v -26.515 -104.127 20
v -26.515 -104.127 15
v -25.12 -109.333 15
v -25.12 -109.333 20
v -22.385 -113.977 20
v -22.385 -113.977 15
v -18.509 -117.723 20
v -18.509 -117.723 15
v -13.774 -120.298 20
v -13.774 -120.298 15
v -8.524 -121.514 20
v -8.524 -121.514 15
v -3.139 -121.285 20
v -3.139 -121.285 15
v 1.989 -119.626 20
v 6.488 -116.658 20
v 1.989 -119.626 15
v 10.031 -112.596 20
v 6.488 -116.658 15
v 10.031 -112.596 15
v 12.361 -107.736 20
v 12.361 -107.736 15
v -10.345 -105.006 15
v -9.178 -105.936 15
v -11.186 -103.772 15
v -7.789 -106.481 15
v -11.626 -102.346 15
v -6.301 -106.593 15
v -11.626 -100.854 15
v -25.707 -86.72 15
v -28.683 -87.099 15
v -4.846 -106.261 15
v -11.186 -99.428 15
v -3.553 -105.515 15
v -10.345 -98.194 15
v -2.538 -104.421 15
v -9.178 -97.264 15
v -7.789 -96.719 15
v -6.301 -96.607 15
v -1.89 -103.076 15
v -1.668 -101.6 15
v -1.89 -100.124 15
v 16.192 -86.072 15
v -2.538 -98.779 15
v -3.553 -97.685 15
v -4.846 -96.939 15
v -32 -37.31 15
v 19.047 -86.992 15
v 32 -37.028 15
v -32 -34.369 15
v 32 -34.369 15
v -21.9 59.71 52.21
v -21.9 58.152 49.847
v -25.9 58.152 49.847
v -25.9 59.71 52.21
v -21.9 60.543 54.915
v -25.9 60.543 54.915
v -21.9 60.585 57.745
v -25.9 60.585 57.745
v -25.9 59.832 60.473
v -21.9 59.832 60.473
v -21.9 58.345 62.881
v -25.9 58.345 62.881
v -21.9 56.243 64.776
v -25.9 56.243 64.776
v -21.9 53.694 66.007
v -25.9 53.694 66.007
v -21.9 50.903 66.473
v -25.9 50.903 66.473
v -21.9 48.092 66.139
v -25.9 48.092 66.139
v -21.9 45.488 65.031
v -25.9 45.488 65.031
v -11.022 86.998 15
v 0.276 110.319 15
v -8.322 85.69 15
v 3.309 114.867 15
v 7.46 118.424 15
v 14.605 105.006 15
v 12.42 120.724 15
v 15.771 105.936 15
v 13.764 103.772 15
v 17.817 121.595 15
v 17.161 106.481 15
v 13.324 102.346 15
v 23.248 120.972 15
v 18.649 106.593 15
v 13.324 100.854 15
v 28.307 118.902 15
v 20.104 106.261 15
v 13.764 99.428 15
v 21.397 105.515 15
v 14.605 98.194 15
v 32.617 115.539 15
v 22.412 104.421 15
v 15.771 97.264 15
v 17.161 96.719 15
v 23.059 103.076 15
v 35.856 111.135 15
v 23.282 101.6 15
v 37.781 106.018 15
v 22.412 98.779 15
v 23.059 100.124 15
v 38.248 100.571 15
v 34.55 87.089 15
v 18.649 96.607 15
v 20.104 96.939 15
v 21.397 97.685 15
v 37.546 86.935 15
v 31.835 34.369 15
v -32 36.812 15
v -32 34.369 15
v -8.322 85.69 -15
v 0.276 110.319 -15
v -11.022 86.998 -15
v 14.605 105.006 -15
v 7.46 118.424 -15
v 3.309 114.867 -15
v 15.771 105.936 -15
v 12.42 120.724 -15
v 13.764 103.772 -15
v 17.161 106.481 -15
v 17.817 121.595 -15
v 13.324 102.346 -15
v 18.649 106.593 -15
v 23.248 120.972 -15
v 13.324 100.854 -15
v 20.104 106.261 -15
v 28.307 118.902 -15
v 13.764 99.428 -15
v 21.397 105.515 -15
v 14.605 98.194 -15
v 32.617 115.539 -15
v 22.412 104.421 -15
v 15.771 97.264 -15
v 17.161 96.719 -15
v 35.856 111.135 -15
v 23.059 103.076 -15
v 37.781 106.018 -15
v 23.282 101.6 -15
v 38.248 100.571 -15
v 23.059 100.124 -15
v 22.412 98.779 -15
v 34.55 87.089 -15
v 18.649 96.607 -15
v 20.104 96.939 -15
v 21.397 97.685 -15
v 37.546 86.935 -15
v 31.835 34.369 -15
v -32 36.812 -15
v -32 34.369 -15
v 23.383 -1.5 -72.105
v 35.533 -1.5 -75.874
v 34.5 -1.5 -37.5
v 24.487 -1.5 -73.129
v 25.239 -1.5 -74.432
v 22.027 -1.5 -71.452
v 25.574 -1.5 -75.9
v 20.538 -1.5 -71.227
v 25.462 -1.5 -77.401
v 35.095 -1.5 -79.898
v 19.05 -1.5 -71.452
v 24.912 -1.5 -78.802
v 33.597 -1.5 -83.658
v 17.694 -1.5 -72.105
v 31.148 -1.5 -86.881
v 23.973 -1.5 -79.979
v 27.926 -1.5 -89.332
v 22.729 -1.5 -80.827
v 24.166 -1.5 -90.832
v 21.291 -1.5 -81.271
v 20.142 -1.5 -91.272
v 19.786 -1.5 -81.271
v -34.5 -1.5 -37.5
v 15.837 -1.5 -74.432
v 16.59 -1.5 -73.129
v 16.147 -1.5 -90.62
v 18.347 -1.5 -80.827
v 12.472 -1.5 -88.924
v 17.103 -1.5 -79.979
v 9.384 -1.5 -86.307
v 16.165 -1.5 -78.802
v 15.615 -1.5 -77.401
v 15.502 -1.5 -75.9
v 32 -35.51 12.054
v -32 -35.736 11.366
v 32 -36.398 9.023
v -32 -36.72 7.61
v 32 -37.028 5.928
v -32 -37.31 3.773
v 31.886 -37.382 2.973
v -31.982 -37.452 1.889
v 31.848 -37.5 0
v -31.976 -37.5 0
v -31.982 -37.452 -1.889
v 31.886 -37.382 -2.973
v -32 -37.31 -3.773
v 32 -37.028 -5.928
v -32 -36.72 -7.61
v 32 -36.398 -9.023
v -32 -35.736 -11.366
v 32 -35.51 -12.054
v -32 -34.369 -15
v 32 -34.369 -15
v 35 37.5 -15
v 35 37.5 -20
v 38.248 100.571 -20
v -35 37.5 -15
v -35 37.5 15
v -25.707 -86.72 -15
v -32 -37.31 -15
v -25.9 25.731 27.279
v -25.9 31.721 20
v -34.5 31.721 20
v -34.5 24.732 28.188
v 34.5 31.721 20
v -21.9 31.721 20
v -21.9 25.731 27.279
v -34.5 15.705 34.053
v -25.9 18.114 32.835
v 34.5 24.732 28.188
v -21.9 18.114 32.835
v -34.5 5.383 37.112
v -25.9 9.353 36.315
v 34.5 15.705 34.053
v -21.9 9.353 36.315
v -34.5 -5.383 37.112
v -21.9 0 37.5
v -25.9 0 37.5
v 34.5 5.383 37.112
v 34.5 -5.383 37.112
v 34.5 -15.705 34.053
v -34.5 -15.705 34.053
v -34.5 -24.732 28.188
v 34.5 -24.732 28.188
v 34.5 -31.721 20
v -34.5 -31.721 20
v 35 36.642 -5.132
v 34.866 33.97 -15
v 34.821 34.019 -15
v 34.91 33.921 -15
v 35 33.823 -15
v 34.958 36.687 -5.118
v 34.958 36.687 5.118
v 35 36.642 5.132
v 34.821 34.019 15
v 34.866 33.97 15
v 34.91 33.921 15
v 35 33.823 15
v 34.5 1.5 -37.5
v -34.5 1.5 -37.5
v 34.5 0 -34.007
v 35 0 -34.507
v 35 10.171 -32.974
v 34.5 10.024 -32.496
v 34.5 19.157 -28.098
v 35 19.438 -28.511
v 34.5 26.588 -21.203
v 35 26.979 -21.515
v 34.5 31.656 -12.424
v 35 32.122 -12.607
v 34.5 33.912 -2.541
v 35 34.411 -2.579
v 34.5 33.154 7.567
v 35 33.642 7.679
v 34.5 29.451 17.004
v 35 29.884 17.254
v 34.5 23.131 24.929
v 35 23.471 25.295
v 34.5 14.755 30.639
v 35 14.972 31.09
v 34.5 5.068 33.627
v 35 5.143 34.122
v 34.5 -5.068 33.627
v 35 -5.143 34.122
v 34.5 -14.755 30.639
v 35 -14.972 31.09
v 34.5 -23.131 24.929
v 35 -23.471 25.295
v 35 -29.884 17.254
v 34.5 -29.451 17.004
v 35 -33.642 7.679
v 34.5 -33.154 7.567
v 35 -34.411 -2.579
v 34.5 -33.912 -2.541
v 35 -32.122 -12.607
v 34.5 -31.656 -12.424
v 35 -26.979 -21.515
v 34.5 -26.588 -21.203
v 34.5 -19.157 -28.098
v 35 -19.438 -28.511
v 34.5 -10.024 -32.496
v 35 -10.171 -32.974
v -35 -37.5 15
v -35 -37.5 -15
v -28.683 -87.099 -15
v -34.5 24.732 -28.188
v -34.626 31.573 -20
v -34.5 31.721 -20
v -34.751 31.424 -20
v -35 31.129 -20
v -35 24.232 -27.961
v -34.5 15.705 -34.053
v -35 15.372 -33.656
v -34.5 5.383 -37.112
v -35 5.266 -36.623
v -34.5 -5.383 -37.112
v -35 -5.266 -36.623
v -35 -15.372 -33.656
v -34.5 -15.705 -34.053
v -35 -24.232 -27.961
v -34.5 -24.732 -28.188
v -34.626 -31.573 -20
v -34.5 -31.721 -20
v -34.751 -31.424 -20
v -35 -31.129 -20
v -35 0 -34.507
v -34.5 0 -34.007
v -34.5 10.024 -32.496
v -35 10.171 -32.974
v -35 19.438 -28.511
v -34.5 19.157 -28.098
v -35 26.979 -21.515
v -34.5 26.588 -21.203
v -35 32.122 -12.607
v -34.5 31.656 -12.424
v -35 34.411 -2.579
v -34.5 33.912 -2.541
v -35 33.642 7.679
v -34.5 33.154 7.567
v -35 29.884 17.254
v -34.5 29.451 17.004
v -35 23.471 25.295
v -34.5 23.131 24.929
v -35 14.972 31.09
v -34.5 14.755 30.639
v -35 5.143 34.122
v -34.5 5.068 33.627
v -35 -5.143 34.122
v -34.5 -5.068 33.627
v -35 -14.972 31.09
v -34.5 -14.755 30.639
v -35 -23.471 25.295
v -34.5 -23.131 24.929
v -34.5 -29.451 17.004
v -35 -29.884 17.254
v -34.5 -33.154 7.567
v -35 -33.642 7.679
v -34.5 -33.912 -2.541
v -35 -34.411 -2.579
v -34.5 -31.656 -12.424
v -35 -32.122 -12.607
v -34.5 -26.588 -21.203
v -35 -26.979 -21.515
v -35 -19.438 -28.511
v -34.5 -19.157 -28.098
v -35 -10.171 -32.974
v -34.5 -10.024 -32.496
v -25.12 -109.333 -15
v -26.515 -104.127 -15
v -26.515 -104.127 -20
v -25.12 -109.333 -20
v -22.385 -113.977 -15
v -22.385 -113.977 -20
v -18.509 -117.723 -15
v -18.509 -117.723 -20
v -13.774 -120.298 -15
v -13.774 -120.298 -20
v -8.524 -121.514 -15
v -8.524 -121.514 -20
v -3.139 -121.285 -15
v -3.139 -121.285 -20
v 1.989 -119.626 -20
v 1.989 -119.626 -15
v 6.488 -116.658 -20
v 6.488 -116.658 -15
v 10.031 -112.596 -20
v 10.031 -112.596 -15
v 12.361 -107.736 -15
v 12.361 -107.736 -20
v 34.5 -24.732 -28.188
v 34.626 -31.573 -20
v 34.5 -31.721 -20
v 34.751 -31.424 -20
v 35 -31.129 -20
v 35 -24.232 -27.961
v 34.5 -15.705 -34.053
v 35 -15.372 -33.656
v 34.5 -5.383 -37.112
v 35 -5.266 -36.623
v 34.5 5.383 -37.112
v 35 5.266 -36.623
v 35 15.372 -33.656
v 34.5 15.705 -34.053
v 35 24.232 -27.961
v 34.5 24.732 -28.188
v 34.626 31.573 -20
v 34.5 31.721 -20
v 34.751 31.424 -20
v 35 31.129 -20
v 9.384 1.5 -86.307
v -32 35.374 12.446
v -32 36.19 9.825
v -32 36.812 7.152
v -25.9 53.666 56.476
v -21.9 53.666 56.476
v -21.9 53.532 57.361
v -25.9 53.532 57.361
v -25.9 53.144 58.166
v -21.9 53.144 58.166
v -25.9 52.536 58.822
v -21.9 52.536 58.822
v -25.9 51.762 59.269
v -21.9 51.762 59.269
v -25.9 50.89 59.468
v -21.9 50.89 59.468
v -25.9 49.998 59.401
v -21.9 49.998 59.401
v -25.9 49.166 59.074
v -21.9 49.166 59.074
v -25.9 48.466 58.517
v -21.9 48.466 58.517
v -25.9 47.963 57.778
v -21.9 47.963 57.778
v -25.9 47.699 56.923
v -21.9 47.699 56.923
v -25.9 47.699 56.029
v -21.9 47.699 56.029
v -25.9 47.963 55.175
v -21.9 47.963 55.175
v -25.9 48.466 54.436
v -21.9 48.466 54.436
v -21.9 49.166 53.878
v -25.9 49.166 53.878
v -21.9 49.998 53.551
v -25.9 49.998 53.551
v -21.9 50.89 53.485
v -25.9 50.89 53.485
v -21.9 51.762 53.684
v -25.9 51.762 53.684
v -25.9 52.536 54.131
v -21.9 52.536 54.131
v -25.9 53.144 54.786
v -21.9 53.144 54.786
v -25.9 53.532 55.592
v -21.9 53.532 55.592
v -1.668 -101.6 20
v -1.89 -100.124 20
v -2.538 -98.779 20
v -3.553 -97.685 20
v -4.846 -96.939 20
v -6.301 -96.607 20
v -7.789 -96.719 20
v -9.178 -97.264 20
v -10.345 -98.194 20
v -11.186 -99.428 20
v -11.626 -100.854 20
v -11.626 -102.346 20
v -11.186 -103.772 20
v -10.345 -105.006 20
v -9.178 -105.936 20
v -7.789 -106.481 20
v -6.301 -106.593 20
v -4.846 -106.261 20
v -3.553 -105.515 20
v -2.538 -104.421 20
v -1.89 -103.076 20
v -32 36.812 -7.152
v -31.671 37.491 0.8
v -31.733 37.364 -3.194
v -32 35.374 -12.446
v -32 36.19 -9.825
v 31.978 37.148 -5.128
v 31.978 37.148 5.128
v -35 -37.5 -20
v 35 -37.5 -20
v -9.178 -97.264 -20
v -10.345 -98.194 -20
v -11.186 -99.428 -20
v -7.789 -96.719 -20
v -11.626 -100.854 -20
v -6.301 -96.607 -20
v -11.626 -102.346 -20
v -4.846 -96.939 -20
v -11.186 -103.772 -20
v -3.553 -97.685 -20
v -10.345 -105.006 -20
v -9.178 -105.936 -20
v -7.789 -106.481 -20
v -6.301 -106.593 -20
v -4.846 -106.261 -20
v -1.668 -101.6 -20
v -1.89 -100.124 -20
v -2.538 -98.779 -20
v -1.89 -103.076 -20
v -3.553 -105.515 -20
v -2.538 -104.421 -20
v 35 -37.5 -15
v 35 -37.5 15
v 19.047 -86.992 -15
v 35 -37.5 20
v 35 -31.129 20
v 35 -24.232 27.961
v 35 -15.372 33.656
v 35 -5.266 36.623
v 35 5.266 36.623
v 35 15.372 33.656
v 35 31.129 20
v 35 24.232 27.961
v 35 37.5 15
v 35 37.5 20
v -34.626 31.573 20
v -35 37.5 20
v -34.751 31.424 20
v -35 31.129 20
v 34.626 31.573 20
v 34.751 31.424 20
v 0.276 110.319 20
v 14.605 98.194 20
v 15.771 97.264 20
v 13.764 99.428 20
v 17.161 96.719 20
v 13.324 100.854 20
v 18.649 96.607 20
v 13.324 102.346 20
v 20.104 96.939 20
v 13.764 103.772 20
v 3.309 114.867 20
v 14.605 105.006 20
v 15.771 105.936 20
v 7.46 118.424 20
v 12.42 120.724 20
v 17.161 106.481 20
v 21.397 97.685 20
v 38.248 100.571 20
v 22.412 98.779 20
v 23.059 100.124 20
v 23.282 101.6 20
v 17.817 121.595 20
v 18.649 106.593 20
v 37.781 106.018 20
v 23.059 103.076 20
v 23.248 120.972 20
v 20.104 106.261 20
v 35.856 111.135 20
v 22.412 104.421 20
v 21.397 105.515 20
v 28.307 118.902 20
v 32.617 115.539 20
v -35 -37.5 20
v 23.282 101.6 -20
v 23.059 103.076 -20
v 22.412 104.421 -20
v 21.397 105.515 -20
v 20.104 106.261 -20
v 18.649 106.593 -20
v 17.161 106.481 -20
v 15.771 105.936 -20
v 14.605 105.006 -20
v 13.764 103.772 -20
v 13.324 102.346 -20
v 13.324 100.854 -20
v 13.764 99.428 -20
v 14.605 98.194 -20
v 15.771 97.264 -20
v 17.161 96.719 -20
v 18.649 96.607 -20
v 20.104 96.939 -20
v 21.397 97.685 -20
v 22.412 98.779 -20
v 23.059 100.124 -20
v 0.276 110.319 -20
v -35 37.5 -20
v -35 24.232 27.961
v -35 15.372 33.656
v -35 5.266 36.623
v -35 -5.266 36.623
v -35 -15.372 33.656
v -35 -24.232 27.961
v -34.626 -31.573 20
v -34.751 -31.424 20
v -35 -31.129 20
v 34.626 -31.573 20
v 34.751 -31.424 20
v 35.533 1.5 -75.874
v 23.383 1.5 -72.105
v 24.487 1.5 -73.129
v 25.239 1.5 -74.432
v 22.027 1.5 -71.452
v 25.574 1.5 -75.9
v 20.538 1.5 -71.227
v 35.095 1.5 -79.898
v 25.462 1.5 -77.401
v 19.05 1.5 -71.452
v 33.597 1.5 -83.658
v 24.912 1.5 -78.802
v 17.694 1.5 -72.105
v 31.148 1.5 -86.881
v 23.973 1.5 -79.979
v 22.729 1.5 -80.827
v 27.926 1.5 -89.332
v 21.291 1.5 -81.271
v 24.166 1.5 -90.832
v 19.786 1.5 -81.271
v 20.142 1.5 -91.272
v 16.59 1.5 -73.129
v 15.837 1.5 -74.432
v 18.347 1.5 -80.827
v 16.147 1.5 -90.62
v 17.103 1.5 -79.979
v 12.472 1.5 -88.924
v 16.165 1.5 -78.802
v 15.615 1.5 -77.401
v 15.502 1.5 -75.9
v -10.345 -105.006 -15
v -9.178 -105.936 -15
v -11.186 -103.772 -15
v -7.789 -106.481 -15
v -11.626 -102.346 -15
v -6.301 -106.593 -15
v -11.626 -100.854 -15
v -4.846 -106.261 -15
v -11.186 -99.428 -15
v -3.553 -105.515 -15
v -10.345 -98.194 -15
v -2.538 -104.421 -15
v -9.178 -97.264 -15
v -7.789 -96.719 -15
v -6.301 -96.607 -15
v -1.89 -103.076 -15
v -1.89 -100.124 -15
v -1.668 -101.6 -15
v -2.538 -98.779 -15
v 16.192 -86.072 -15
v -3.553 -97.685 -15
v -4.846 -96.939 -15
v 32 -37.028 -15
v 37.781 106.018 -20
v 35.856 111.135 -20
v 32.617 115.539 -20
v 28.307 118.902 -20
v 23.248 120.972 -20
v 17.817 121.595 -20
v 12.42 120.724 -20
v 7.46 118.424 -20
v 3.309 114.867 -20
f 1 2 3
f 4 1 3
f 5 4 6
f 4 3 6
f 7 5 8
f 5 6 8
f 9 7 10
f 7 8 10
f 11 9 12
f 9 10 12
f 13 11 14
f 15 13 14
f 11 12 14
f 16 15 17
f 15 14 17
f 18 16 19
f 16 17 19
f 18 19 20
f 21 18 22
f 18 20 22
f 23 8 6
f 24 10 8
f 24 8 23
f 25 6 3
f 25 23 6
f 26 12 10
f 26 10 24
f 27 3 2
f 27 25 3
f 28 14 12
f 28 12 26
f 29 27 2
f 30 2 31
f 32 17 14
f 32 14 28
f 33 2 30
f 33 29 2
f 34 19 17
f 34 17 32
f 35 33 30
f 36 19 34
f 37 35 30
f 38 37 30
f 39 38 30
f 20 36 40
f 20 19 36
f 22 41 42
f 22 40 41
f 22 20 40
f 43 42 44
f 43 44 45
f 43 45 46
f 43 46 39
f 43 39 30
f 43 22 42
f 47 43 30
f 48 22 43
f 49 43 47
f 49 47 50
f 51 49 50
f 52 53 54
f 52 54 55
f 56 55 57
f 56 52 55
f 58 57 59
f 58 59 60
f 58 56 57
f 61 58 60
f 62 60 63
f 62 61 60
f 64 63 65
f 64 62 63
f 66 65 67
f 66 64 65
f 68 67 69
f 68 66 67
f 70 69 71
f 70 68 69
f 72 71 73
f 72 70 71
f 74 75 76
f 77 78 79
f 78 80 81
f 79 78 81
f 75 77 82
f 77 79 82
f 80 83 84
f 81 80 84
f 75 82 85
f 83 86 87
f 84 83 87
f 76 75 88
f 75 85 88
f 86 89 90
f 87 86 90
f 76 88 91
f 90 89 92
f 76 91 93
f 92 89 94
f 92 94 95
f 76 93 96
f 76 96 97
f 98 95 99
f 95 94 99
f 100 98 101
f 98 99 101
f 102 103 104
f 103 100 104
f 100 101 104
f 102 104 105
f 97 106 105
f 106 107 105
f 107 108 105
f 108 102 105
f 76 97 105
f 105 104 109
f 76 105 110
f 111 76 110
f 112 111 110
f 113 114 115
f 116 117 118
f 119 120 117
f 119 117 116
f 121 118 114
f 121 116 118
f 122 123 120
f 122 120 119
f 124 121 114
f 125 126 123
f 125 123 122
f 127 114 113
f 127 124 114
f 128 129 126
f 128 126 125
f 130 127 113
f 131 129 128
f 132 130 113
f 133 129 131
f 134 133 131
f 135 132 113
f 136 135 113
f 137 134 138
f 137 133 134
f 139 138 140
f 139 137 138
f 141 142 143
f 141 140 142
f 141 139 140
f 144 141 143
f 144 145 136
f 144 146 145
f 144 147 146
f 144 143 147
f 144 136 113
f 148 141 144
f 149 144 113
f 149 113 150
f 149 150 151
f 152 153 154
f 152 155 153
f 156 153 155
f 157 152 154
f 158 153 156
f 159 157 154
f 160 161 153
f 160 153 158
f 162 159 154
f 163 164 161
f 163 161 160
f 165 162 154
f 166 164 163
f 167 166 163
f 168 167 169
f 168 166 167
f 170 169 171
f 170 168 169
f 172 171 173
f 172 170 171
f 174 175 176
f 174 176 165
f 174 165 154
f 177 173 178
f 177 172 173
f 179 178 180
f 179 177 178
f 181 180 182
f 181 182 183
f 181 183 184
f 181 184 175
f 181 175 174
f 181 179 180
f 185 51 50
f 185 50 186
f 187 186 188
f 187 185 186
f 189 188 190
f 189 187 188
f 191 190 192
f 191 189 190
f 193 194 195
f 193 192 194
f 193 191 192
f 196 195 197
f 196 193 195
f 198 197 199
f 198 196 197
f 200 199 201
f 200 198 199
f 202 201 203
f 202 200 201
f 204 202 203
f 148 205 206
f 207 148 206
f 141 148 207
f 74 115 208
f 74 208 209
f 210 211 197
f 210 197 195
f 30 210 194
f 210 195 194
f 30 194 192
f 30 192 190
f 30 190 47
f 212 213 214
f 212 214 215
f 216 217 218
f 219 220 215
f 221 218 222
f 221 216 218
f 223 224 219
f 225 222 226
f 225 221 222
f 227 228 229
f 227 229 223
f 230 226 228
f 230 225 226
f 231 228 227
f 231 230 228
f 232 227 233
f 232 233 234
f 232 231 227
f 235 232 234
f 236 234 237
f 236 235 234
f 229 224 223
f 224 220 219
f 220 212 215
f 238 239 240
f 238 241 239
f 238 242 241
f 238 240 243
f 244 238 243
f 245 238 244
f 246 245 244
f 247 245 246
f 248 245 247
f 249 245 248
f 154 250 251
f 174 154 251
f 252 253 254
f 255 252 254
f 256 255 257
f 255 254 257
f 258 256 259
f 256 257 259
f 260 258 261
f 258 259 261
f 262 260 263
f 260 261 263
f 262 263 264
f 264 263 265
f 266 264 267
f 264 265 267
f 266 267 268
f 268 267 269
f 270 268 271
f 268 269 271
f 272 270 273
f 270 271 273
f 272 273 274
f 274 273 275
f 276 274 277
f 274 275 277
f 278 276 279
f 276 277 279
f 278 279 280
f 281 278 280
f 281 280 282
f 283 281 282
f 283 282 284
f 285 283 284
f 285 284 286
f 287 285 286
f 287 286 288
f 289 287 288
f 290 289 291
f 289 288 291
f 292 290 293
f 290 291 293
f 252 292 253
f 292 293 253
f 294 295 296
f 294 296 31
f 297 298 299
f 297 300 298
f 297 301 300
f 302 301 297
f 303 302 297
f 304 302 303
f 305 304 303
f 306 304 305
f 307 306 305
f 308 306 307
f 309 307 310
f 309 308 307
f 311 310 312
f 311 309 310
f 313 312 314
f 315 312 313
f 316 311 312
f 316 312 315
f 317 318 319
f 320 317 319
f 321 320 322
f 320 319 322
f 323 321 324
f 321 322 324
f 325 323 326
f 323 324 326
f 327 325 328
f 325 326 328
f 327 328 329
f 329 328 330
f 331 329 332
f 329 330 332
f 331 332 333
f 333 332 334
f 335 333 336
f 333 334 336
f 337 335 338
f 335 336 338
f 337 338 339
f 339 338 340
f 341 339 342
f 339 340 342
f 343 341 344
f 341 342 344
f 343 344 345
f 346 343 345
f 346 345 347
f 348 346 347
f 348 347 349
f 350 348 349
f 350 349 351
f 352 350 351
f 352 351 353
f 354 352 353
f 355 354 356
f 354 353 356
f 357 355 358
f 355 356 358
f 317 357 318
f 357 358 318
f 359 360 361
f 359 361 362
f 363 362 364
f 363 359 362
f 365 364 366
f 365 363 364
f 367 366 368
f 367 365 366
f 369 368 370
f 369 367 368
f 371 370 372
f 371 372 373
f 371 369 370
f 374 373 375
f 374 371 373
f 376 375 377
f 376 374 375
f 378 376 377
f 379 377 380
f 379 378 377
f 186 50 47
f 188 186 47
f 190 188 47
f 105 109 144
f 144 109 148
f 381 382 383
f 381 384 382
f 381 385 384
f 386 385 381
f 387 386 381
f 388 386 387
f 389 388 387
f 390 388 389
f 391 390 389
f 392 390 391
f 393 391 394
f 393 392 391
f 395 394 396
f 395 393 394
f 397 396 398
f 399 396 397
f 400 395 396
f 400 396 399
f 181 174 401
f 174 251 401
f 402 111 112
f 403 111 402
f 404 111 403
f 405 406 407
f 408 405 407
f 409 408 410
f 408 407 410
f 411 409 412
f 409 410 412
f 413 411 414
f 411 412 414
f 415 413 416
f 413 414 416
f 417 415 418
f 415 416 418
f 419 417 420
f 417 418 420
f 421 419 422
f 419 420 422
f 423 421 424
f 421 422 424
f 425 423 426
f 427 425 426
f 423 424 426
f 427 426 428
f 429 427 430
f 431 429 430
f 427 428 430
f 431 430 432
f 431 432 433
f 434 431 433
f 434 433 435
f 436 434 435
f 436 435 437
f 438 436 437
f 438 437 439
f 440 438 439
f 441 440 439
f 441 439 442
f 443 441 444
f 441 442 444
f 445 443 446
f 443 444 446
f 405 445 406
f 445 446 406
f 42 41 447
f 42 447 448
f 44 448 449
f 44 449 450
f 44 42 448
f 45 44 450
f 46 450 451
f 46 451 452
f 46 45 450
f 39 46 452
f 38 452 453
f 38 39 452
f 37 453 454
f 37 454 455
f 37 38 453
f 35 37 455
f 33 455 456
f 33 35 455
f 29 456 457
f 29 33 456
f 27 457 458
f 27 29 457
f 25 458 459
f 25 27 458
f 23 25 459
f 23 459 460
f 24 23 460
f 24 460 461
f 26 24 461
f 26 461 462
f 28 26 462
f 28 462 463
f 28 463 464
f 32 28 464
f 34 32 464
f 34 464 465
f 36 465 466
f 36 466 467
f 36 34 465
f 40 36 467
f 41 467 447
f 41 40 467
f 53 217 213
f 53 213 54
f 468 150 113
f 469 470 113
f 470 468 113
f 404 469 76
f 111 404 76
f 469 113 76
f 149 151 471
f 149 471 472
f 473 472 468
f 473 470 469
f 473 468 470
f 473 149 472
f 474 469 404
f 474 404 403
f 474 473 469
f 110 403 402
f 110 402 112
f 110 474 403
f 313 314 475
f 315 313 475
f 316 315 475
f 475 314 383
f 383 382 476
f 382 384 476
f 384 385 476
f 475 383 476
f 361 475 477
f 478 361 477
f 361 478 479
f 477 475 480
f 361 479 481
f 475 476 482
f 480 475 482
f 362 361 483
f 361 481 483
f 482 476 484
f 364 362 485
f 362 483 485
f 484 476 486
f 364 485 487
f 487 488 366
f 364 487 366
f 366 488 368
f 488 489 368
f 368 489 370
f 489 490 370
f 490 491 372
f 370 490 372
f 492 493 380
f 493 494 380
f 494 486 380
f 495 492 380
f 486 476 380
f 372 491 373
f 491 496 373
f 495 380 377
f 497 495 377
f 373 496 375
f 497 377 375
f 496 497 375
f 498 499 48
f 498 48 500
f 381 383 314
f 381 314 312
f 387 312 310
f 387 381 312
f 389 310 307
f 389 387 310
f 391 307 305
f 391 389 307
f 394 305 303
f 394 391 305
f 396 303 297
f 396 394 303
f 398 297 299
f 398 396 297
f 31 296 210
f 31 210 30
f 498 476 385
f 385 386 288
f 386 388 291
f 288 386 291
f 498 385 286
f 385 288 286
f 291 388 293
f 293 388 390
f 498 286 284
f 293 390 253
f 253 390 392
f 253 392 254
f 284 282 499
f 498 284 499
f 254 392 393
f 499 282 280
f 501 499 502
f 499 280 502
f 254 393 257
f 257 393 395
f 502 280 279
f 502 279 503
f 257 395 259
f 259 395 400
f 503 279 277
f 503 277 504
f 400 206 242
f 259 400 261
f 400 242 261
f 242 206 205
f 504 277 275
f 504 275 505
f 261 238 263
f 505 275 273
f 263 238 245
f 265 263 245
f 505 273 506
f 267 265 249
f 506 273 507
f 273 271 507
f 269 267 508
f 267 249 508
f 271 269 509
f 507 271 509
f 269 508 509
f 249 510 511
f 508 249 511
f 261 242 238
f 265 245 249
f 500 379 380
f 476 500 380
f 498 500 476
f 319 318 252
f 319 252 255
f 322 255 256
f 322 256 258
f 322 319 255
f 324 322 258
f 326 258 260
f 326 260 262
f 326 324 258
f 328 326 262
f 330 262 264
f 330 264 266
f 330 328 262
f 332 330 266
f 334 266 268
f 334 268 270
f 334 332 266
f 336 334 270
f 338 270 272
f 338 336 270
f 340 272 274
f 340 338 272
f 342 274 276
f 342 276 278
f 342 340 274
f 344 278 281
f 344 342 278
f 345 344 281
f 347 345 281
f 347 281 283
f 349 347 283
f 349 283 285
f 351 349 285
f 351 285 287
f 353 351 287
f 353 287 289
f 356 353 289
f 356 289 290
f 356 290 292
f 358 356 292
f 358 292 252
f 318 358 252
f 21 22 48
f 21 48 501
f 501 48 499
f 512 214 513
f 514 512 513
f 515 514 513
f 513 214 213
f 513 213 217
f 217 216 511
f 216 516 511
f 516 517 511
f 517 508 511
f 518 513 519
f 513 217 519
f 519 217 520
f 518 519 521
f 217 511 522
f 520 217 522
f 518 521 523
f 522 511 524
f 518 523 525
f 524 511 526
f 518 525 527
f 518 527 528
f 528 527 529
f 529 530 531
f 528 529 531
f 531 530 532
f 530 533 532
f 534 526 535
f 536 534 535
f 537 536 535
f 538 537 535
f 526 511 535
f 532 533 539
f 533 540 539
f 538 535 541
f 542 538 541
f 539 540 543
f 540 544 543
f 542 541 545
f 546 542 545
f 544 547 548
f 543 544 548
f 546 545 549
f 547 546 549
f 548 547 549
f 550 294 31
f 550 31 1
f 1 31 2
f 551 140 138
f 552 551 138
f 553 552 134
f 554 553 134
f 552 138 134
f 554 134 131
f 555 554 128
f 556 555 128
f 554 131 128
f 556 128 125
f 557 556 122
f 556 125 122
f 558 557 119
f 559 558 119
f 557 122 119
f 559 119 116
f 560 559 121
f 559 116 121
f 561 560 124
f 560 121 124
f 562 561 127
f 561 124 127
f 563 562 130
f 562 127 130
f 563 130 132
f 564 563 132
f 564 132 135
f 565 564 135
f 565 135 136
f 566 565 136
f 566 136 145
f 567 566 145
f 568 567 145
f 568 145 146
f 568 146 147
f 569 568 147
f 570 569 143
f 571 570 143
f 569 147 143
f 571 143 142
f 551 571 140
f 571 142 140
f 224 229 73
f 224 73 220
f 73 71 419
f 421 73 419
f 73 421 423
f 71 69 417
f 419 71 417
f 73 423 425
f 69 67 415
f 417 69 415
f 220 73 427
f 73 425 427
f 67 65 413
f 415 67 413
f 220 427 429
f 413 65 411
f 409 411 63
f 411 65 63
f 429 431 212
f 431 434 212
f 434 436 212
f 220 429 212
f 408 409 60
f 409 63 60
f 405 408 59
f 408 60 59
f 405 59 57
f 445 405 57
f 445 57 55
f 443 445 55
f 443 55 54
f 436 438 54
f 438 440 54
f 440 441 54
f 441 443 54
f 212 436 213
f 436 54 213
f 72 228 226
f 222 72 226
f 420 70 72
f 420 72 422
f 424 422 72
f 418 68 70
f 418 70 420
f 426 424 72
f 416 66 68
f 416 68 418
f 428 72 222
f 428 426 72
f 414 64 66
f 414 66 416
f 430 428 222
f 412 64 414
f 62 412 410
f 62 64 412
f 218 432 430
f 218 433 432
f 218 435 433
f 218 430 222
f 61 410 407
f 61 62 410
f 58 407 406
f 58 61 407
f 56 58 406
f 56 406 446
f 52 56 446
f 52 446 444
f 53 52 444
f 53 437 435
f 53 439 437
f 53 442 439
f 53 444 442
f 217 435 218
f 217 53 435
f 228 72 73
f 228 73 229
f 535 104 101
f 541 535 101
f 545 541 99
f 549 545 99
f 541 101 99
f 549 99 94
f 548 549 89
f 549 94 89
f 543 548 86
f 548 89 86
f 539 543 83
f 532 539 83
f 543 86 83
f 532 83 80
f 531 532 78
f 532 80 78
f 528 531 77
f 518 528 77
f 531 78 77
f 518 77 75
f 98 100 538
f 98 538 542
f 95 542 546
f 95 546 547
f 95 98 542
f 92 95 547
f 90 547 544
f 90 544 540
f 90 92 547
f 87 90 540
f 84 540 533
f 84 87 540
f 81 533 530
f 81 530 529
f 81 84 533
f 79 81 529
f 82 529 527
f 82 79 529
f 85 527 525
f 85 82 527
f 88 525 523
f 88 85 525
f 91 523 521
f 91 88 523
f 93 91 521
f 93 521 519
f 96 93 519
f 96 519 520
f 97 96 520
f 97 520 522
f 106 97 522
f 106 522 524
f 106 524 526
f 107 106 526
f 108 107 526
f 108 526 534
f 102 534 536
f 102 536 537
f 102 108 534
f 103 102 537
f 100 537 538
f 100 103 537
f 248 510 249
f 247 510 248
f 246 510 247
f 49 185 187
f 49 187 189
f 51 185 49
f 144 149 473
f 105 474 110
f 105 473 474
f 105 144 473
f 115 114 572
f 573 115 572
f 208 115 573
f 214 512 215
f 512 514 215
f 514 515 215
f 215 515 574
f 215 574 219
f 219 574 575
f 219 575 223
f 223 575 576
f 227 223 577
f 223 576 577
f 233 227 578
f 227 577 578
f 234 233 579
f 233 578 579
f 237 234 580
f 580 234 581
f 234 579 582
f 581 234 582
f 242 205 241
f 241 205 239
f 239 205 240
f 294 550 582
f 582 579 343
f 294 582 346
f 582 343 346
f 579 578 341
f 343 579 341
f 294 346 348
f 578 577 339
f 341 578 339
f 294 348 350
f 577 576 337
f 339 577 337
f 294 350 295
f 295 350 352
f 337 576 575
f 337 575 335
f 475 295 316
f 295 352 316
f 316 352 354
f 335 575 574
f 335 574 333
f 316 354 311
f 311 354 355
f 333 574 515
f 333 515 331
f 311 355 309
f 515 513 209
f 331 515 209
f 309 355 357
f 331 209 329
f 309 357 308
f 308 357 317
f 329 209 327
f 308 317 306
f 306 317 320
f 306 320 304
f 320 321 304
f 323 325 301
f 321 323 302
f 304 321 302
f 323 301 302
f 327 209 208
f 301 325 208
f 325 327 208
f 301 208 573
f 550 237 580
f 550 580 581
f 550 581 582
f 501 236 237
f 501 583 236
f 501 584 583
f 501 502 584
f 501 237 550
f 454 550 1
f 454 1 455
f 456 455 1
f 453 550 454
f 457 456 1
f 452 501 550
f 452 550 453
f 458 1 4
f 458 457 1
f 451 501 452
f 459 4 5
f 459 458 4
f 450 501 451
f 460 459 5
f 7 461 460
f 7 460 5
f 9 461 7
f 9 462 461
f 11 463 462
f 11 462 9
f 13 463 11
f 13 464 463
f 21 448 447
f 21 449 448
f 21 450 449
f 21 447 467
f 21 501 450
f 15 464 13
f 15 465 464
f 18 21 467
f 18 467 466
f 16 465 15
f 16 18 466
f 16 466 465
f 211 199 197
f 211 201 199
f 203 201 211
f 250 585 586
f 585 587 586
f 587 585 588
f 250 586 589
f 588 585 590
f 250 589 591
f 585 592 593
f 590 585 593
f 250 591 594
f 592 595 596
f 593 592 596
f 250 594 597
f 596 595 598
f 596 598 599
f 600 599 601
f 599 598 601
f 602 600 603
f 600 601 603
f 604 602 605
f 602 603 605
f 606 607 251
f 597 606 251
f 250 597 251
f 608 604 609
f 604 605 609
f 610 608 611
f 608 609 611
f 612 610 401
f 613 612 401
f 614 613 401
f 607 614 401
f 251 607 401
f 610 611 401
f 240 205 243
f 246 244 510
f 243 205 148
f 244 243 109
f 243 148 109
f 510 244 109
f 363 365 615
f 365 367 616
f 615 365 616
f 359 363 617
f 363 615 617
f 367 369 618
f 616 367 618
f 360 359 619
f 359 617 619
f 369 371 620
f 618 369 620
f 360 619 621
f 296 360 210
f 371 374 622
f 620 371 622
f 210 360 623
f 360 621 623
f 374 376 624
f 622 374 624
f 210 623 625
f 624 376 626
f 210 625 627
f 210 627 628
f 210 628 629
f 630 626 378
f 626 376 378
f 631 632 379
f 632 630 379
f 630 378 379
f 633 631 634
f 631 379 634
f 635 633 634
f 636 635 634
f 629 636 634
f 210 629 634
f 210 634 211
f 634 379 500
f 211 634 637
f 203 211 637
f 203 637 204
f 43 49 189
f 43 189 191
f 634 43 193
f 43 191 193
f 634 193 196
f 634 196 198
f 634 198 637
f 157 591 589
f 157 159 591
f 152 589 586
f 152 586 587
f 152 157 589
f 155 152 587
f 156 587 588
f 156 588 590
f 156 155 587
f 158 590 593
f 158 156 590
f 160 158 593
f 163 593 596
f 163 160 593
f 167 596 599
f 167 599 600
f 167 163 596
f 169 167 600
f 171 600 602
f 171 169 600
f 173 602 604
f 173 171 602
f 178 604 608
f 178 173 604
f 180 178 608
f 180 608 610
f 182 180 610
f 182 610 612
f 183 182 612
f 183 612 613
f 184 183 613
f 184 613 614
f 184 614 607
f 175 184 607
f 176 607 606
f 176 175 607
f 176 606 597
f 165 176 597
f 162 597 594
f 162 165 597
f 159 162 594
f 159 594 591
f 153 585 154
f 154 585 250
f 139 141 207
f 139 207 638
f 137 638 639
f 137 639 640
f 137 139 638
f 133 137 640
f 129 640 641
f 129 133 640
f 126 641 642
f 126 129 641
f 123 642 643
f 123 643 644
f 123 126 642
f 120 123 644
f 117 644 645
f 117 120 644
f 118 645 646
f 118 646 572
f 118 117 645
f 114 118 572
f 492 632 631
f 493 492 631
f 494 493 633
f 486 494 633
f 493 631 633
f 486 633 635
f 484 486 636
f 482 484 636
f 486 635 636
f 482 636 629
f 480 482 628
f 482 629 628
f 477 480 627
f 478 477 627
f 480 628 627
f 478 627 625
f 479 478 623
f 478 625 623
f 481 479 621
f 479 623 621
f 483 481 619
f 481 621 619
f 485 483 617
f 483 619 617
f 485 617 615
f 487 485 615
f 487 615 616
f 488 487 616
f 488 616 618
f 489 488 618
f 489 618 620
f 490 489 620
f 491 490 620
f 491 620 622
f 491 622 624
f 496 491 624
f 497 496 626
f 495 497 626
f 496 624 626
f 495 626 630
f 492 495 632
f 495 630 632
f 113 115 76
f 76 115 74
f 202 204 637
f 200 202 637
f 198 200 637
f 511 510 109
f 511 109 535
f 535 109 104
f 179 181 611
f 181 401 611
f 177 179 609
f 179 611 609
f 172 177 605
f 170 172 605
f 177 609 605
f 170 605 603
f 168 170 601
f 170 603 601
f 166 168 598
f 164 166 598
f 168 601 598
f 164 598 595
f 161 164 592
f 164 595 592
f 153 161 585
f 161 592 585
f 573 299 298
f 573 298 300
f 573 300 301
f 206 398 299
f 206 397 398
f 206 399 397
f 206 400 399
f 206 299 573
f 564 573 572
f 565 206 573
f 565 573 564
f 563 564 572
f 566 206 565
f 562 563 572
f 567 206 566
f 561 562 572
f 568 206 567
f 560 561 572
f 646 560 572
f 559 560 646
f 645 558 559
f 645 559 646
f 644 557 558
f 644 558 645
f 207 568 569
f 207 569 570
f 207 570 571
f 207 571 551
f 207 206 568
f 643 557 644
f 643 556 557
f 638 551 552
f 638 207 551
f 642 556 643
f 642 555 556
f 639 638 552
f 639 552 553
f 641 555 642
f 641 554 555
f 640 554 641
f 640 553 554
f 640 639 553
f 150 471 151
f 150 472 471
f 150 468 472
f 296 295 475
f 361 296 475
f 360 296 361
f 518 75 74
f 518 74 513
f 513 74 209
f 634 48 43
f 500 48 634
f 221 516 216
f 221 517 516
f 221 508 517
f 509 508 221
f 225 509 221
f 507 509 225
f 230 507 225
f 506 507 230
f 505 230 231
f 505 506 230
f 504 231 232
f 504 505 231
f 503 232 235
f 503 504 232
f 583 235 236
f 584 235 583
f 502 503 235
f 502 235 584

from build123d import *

# Parameters (mm, degrees)
SKETCH1_R             = 37.5
SKETCH1_R_2           = 34.007
BOSS_EXTRUDE1_DEPTH   = 35
BOSS_EXTRUDE2_START   = 15
SKETCH4_R             = 5.007
BOSS_EXTRUDE2_DEPTH   = 5
BOSS_EXTRUDE2_2_DEPTH = 5
BOSS_EXTRUDE3_START   = -15
SKETCH5_R             = 5.007
BOSS_EXTRUDE3_DEPTH   = 5
BOSS_EXTRUDE3_2_DEPTH = 5
BOSS_EXTRUDE4_DEPTH   = 70
CHAMFER1_SIZE         = 0.5
CHAMFER2_SIZE         = 0.5
BOSS_EXTRUDE8_DEPTH   = 3
SKETCH13_W            = 30
SKETCH13_H            = 55
BOSS_EXTRUDE9_DEPTH   = 3
BOSS_EXTRUDE10_DEPTH  = 3
SKETCH15_W            = 30
SKETCH15_H            = 50
BOSS_EXTRUDE11_DEPTH  = 3
BOSS_EXTRUDE12_DEPTH  = 3
SKETCH17_W            = 30
SKETCH17_H            = 52
BOSS_EXTRUDE13_DEPTH  = 3
BOSS_EXTRUDE14_DEPTH  = 3
SKETCH21_R            = 5.05
BOSS_EXTRUDE15_DEPTH  = 1.5
BOSS_EXTRUDE16_START  = 4
SKETCH22_R            = 3
BOSS_EXTRUDE16_DEPTH  = 4


with BuildPart() as part:
    # Sketch1 → Boss-Extrude1 (new, symmetric)
    with BuildSketch(Plane(origin=(0, 0, 0), x_dir=(0, 0, -1), z_dir=(1, 0, 0))):
        Circle(SKETCH1_R)
        Circle(SKETCH1_R_2, mode=Mode.SUBTRACT)
    extrude(amount=BOSS_EXTRUDE1_DEPTH, both=True)



with BuildPart() as body_2:
    # Sketch4 → Boss-Extrude2 (new body)
    with BuildSketch(Plane.XY.offset(BOSS_EXTRUDE2_START)):
        with BuildLine():
            Line((0.275652512, 110.319327951), (-35, 37.5))
            Line((-35, 37.5), (35, 37.5))
            Line((35, 37.5), (38.248437197, 100.571279081))
            ThreePointArc((38.248437197, 100.571279081), (23.247893056, 120.971872737), (0.275652512, 110.319327951))
        make_face()
        with Locations((18.274911388, 101.6)):
            Circle(SKETCH4_R, mode=Mode.SUBTRACT)
    extrude(amount=BOSS_EXTRUDE2_DEPTH)


with BuildPart() as body_3:
    # Sketch4 → Boss-Extrude2 2 (new body)
    with BuildSketch(Plane.XY.offset(BOSS_EXTRUDE2_START)):
        with BuildLine():
            Line((-35, -37.5), (-26.514661672, -104.126718952))
            ThreePointArc((-26.514661672, -104.126718952), (-8.523708177, -121.514365429), (12.360633821, -107.735798124))
            Line((12.360633821, -107.735798124), (35, -37.5))
            Line((35, -37.5), (-35, -37.5))
        make_face()
        with Locations((-6.674911388, -101.6)):
            Circle(SKETCH4_R, mode=Mode.SUBTRACT)
    extrude(amount=BOSS_EXTRUDE2_2_DEPTH)


with BuildPart() as body_4:
    # Sketch5 → Boss-Extrude3 (new body)
    with BuildSketch(Plane.XY.offset(BOSS_EXTRUDE3_START)):
        with BuildLine():
            Line((35, -37.5), (-35, -37.5))
            Line((-35, -37.5), (-26.514661672, -104.126718952))
            ThreePointArc((-26.514661672, -104.126718952), (-8.523708177, -121.514365429), (12.360633821, -107.735798124))
            Line((12.360633821, -107.735798124), (35, -37.5))
        make_face()
        with Locations((-6.674911388, -101.6)):
            Circle(SKETCH5_R, mode=Mode.SUBTRACT)
    extrude(amount=-BOSS_EXTRUDE3_DEPTH)


with BuildPart() as body_5:
    # Sketch5 → Boss-Extrude3 2 (new body)
    with BuildSketch(Plane.XY.offset(BOSS_EXTRUDE3_START)):
        with BuildLine():
            Line((35, 37.5), (38.248437197, 100.571279081))
            ThreePointArc((38.248437197, 100.571279081), (23.247893056, 120.971872737), (0.275652512, 110.319327951))
            Line((0.275652512, 110.319327951), (-35, 37.5))
            Line((-35, 37.5), (35, 37.5))
        make_face()
        with Locations((18.274911388, 101.6)):
            Circle(SKETCH5_R, mode=Mode.SUBTRACT)
    extrude(amount=-BOSS_EXTRUDE3_2_DEPTH)


with BuildPart() as part_1:
    add(part.part)

    add(body_2.part)  # Boss-Extrude4 merges body 2

    add(body_3.part)  # Boss-Extrude4 merges body 3

    add(body_4.part)  # Boss-Extrude4 merges body 4

    add(body_5.part)  # Boss-Extrude4 merges body 5
    # Sketch6 → Boss-Extrude4 (add)
    with BuildSketch(Plane(origin=(35, 0, 0), x_dir=(0, 0, -1), z_dir=(1, 0, 0))):
        with BuildLine():
            Line((20, -37.5), (15, -37.5))
            Line((15, -37.5), (15, -34.369317712))
            ThreePointArc((15, -34.369317712), (17.550008803, -33.139812779), (20, -31.721443851))
            Line((20, -31.721443851), (20, -37.5))
        make_face()
        with BuildLine():
            Line((-20, -37.5), (-15, -37.5))
            Line((-15, -37.5), (-15, -34.369317712))
            ThreePointArc((-15, -34.369317712), (-17.550008803, -33.139812779), (-20, -31.721443851))
            Line((-20, -31.721443851), (-20, -37.5))
        make_face()
        with BuildLine():
            Line((20, 37.5), (15, 37.5))
            Line((15, 37.5), (15, 34.369317712))
            ThreePointArc((15, 34.369317712), (17.550008803, 33.139812779), (20, 31.721443851))
            Line((20, 31.721443851), (20, 37.5))
        make_face()
        with BuildLine():
            Line((-20, 37.5), (-15, 37.5))
            Line((-15, 37.5), (-15, 34.369317712))
            ThreePointArc((-15, 34.369317712), (-17.550008803, 33.139812779), (-20, 31.721443851))
            Line((-20, 31.721443851), (-20, 37.5))
        make_face()
    extrude(amount=-BOSS_EXTRUDE4_DEPTH)

    # Chamfer1
    chamfer1_edges = [part_1.edges().sort_by_distance(p)[0] for p in [
        (35, -37.5, 0),
        (35, 37.5, 0),
        (35, 0, 34.007),
        (35, 0, 37.5),
        (35, 0, -37.5),
    ]]
    chamfer(chamfer1_edges, length=CHAMFER1_SIZE)

    # Chamfer2
    chamfer2_edges = [part_1.edges().sort_by_distance(p)[0] for p in [
        (-35, 0, -37.5),
        (-35, -37.5, 0),
        (-35, 37.5, 0),
        (-35, 0, 34.007),
        (-35, 0, 37.5),
    ]]
    chamfer(chamfer2_edges, length=CHAMFER2_SIZE)

    # Sketch12 → Boss-Extrude8 (add)
    with BuildSketch(Plane(origin=(32.981103177, -1.69866608, 0), x_dir=(0, 0, -1), z_dir=(0.9986762904840372, -0.05143604597014742, 0))):
        with BuildLine():
            Line((-15, 39.250622502), (-15, 88.751284357))
            Line((-15, 88.751284357), (15, 88.751284357))
            Line((15, 88.751284357), (15, 39.250622502))
            Line((15, 39.250622502), (15, 35.578558741))
            add(Edge.make_bspline(
                [(15, 35.578558741), (0, 42.22201753), (-15, 35.578558741)],
                knots=[1.153374055, 1.153374055, 1.153374055, 1.988218598, 1.988218598, 1.988218598], degree=2, weights=[1, 0.914137001, 1]))
            Line((-15, 35.578558741), (-15, 39.250622502))
        make_face()
    extrude(amount=-BOSS_EXTRUDE8_DEPTH)

    # Sketch13 → Boss-Extrude9 (add)
    with BuildSketch(Plane(origin=(-43.060925602, 20.859877331, 0), x_dir=(0, 0, 1), z_dir=(-0.8999629437964011, 0.435966397550678, 0))):
        with Locations((0, 45.989786478)):
            Rectangle(SKETCH13_W, SKETCH13_H)
    extrude(amount=-BOSS_EXTRUDE9_DEPTH)

    # Sketch14 → Boss-Extrude10 (add)
    with BuildSketch(Plane.ZY.offset(35)):
        with BuildLine():
            Line((15, 37.5), (15, 33.823069051))
            ThreePointArc((15, 33.823069051), (0, 37), (-15, 33.823069051))
            Line((-15, 33.823069051), (-15, 37.5))
            Line((-15, 37.5), (15, 37.5))
        make_face()
    extrude(amount=-BOSS_EXTRUDE10_DEPTH)

    # Sketch15 → Boss-Extrude11 (add)
    with BuildSketch(Plane(origin=(-39.141011091, -4.984857829, 0), x_dir=(0, 0, 1), z_dir=(-0.9919875142057744, -0.1263359476152713, 0))):
        with Locations((0, -57.777773616)):
            Rectangle(SKETCH15_W, SKETCH15_H)
    extrude(amount=-BOSS_EXTRUDE11_DEPTH)

    # Sketch16 → Boss-Extrude12 (add)
    with BuildSketch(Plane.ZY.offset(35)):
        with BuildLine():
            Line((15, -37.5), (-15, -37.5))
            Line((-15, -37.5), (-15, -33.823069051))
            ThreePointArc((-15, -33.823069051), (0, -37), (15, -33.823069051))
            Line((15, -33.823069051), (15, -37.5))
        make_face()
    extrude(amount=-BOSS_EXTRUDE12_DEPTH)

    # Sketch17 → Boss-Extrude13 (add)
    with BuildSketch(Plane(origin=(42.655635488, -13.749349722, 0), x_dir=(0, 0, -1), z_dir=(0.9517772604145124, -0.30678990621897206, 0))):
        with Locations((0, -50.954000548)):
            Rectangle(SKETCH17_W, SKETCH17_H)
    extrude(amount=-BOSS_EXTRUDE13_DEPTH)

    # Sketch19 → Boss-Extrude14 (add)
    with BuildSketch(Plane(origin=(35, 0, 0), x_dir=(0, 0, -1), z_dir=(1, 0, 0))):
        with BuildLine():
            Line((-15, -37.5), (-15, -33.823069051))
            ThreePointArc((-15, -33.823069051), (0, -37), (15, -33.823069051))
            Line((15, -33.823069051), (15, -37.5))
            Line((15, -37.5), (-15, -37.5))
        make_face()
    extrude(amount=-BOSS_EXTRUDE14_DEPTH)

    # Sketch22 → Boss-Extrude16 (add)
    with BuildSketch(Plane(origin=(-25.9, 0, 0), x_dir=(0, 0, -1), z_dir=(1, 0, 0)).offset(BOSS_EXTRUDE16_START)):
        with BuildLine():
            Line((-20, 31.721443851), (-49.846569163, 58.152097784))
            ThreePointArc((-49.846569163, 58.152097784), (-62.88120643, 58.345214822), (-65.03129666, 45.487681042))
            Line((-65.03129666, 45.487681042), (-37.5, 0))
            ThreePointArc((-37.5, 0), (-32.834813841, 18.114220933), (-20, 31.721443851))
        make_face()
        with Locations(Location((-56.476235818, 50.665608617, 0), (0, 0, 90))):
            Circle(SKETCH22_R, mode=Mode.SUBTRACT)
    extrude(amount=-BOSS_EXTRUDE16_DEPTH)


with BuildPart() as body_2_2:
    # Sketch21 → Boss-Extrude15 (new, symmetric)
    with BuildSketch(Plane(origin=(0, 0, 0), x_dir=(1, 0, 0), z_dir=(0, 1, 0))):
        with BuildLine():
            Line((34.5, 37.5), (-34.5, 37.5))
            Line((-34.5, 37.5), (9.384212743, 86.306519652))
            ThreePointArc((9.384212743, 86.306519652), (26.096971037, 90.209351988), (35.532926057, 75.873692154))
            Line((35.532926057, 75.873692154), (34.5, 37.5))
        make_face()
        with Locations(Location((20.538357267, 76.277309318, 0), (0, 0, 270))):
            Circle(SKETCH21_R, mode=Mode.SUBTRACT)
    extrude(amount=BOSS_EXTRUDE15_DEPTH, both=True)


solid = Compound([part_1.part, body_2_2.part])
